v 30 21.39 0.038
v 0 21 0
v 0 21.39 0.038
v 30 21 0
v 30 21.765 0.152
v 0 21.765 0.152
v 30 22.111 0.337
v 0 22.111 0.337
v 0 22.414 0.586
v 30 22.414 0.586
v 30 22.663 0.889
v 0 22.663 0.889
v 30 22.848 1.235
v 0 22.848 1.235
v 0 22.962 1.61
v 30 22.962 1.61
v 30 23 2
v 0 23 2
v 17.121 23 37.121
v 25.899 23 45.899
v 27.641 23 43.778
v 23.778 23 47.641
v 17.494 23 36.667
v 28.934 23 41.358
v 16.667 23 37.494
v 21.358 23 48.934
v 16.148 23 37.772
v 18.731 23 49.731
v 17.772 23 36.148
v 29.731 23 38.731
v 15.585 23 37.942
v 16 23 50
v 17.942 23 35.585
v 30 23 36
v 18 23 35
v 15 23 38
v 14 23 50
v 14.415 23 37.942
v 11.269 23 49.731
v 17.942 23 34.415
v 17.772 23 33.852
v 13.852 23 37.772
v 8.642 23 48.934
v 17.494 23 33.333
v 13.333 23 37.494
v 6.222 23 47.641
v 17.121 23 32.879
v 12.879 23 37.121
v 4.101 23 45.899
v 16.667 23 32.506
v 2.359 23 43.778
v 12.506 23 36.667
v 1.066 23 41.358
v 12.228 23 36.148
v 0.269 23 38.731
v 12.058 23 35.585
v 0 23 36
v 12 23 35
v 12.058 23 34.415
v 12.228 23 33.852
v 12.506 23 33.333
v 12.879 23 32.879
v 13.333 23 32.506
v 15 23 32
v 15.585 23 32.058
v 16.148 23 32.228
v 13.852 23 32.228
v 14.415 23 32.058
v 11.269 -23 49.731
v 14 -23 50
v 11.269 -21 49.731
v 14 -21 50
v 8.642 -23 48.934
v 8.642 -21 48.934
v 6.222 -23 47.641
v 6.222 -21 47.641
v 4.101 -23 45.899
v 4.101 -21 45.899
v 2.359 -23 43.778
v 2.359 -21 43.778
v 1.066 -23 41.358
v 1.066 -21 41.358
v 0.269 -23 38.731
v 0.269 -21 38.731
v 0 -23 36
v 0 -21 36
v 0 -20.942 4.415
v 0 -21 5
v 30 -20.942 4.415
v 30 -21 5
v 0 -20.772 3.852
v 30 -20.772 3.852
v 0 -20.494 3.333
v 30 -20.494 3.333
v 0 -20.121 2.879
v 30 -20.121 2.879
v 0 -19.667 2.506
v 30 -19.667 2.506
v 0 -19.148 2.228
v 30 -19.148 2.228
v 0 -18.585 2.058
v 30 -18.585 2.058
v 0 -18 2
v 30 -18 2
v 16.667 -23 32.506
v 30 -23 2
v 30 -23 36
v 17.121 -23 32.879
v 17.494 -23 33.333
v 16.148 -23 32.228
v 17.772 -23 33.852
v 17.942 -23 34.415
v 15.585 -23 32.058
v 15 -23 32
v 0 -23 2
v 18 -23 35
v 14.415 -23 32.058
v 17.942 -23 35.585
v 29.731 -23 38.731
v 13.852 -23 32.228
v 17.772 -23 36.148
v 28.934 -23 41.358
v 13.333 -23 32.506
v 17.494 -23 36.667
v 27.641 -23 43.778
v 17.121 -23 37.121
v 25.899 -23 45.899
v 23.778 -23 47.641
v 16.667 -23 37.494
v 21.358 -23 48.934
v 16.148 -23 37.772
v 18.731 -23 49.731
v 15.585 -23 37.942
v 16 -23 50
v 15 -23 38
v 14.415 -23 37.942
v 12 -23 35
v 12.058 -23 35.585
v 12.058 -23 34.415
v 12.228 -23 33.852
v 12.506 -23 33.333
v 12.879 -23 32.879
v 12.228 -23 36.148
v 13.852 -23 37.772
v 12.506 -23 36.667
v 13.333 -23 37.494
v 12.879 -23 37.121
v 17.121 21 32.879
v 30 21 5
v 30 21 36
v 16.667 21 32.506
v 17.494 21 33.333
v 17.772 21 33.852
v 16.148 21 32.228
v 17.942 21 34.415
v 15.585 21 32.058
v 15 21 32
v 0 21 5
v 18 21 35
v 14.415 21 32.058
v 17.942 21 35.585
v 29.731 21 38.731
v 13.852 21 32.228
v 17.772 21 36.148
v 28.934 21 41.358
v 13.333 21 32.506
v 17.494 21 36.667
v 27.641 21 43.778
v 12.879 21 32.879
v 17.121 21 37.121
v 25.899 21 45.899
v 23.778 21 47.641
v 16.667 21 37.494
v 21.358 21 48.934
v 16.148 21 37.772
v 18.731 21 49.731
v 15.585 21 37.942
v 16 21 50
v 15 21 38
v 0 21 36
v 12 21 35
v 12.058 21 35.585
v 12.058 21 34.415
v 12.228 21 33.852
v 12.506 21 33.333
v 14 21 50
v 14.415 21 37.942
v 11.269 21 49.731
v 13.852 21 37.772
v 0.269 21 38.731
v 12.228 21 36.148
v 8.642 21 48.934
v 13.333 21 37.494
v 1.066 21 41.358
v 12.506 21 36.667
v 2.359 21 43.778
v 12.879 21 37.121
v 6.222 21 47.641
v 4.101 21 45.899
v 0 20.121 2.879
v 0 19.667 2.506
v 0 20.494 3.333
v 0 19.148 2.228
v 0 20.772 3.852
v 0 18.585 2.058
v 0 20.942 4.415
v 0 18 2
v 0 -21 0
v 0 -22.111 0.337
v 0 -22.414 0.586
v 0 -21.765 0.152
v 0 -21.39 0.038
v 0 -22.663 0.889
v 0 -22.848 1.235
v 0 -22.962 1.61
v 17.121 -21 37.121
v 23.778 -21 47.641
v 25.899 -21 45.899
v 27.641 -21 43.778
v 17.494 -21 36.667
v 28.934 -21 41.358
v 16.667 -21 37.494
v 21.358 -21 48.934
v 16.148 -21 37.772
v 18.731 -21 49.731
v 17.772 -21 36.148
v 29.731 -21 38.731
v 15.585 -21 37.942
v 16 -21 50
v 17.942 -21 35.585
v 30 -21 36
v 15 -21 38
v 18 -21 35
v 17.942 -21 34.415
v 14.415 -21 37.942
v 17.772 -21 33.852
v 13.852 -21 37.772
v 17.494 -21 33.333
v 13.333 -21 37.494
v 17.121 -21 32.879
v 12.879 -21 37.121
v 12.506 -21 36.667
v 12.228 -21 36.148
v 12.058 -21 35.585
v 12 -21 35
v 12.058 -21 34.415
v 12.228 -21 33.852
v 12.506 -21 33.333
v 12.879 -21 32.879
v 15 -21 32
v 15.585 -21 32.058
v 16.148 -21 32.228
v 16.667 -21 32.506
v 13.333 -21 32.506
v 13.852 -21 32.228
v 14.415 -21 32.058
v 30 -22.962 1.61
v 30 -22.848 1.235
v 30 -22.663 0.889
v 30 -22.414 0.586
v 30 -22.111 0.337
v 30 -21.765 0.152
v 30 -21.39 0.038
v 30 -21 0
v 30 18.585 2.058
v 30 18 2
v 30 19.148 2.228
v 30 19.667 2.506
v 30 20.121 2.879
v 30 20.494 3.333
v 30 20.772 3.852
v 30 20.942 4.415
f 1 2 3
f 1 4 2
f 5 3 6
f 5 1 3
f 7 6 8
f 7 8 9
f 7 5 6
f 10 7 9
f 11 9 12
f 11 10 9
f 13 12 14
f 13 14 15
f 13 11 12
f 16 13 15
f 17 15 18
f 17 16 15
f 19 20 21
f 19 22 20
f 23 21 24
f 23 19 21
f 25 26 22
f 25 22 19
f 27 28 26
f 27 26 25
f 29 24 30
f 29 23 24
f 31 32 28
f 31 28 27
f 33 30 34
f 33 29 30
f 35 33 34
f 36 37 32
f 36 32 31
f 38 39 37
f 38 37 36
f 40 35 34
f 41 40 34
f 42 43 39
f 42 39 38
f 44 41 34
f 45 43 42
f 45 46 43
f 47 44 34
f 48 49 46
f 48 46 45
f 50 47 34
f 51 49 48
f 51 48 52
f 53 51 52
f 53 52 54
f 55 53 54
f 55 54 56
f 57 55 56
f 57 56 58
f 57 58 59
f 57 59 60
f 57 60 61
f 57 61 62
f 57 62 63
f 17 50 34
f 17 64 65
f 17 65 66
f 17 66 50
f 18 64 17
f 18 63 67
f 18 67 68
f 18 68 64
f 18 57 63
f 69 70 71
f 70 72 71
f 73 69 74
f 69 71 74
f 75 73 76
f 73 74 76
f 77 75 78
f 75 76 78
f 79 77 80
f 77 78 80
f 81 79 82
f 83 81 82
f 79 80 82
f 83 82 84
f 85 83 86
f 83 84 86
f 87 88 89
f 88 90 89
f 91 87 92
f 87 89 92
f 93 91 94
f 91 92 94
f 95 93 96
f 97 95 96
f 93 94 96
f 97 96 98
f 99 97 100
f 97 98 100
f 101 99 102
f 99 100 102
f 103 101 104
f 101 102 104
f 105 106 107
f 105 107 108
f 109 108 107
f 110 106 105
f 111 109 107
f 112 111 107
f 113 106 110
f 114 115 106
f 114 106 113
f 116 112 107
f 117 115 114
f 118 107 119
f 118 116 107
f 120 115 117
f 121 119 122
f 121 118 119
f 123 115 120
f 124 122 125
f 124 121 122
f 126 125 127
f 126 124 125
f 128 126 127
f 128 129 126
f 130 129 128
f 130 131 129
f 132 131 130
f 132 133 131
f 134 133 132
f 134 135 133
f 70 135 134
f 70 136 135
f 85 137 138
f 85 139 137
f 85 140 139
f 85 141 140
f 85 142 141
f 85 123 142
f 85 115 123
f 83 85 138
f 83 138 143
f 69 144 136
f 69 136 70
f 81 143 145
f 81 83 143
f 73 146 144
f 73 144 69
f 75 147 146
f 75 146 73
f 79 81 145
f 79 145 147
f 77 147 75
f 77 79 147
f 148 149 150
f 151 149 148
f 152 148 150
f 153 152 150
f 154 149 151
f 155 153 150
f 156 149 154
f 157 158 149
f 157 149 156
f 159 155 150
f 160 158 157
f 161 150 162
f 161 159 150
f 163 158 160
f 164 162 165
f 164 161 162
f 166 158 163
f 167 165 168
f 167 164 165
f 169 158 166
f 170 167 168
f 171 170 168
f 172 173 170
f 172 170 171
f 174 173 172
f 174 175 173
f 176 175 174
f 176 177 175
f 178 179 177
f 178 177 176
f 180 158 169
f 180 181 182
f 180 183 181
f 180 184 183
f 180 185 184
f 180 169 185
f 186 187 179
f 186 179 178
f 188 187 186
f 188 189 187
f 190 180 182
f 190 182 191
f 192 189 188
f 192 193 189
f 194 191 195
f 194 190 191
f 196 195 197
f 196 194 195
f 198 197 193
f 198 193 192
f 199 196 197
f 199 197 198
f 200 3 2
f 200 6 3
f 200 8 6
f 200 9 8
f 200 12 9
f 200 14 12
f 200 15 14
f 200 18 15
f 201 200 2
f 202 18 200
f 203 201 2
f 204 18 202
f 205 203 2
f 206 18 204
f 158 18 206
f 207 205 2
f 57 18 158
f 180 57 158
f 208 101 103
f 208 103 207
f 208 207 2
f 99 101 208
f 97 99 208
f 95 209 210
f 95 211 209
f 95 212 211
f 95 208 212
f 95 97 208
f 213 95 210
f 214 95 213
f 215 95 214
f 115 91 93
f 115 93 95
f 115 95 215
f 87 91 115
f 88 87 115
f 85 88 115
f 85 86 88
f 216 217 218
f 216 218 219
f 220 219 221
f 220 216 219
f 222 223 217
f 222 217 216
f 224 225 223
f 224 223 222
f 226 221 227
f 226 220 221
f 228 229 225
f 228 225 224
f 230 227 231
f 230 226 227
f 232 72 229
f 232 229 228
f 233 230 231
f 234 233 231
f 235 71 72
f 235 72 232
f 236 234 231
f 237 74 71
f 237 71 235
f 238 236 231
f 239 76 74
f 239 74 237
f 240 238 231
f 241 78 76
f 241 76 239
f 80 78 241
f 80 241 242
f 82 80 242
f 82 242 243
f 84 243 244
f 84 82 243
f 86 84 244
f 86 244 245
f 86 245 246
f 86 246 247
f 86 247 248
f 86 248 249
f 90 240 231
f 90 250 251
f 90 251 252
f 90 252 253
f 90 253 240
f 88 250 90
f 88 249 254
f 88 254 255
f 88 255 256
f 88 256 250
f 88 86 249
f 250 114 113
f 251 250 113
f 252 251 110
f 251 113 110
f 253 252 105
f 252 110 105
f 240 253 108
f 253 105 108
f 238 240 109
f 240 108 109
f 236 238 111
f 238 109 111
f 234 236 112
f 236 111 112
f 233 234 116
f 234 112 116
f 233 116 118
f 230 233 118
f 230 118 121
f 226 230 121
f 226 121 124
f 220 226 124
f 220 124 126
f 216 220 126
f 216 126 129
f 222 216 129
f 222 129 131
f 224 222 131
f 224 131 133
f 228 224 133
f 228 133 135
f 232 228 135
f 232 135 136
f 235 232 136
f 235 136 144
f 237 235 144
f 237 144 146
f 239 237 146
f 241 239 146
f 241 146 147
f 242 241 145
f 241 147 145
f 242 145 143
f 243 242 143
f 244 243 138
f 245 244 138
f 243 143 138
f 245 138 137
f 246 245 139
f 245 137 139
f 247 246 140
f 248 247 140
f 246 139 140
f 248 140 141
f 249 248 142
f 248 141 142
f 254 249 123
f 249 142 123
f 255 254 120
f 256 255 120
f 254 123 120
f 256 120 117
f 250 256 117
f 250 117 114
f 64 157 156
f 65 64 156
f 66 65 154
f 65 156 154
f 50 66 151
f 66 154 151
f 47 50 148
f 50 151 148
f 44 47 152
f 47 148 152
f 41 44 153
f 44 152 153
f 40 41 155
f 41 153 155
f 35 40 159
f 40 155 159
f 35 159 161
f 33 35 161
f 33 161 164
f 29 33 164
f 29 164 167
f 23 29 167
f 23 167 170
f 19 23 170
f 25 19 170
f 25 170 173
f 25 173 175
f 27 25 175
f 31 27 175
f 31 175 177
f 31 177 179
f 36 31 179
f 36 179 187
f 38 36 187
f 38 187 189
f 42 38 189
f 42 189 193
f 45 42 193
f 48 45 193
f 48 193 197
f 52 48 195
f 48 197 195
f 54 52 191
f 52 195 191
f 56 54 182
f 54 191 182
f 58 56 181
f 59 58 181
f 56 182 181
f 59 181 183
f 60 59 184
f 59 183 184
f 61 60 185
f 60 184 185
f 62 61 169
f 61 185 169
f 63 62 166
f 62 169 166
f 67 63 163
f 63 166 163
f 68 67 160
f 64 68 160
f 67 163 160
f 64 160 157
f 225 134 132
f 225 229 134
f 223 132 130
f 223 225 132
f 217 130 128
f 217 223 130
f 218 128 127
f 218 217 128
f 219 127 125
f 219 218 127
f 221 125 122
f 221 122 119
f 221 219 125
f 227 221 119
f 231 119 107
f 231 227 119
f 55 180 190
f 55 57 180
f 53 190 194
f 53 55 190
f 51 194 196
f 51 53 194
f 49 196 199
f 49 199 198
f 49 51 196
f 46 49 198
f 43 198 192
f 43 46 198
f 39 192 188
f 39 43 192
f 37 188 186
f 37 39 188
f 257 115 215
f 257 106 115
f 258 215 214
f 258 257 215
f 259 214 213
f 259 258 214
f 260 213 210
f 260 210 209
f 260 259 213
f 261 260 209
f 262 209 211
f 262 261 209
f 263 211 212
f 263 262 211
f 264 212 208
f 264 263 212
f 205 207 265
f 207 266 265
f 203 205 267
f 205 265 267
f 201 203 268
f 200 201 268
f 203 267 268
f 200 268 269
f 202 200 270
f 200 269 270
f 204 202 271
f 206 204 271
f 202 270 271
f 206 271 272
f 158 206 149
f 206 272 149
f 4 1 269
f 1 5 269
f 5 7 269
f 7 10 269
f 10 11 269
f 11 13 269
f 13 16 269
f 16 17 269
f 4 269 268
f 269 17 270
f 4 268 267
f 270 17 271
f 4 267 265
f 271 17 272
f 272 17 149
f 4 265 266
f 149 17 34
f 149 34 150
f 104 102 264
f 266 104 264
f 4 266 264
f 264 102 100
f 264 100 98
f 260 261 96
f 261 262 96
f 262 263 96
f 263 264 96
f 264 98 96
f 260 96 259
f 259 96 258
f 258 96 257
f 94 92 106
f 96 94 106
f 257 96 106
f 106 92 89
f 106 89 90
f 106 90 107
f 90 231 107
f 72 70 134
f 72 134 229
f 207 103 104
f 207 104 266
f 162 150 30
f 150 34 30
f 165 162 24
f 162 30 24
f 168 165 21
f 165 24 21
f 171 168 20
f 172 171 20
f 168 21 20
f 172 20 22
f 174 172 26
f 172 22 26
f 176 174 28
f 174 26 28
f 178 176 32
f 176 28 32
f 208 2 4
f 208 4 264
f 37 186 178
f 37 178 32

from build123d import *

# Parameters (mm, degrees)
PAD020_DEPTH  = 30
SKETCH004_R   = 3
HOLE003_DEPTH = 46.001
FILLET_R      = 14
FILLET011_R   = 3
FILLET012_R   = 2


with BuildPart() as part:
    # Sketch036 → Pad020 (new body)
    with BuildSketch(Plane.YZ):
        Polygon((-23, 50), (-21, 50), (-21, 2), (21, 2), (21, 50), (23, 50), (23, 0), (-23, 0), align=None)
    extrude(amount=PAD020_DEPTH)

    # Sketch004 (on Face8 of Pad020) → Hole003 (cut, through all)
    with BuildSketch(Plane(origin=(0, -23, 0), x_dir=(0, 0, -1), z_dir=(0, -1, 0))):
        with Locations((-35, 15)):
            Circle(SKETCH004_R)
    extrude(amount=-HOLE003_DEPTH, mode=Mode.SUBTRACT)

    # Fillet
    fillet_edges = [part.edges().sort_by_distance(p)[0] for p in [
        (30, 22, 50),
        (30, -22, 50),
        (0, -22, 50),
        (0, 22, 50),
    ]]
    fillet(fillet_edges, radius=FILLET_R)

    # Fillet011
    fillet011_edges = [part.edges().sort_by_distance(p)[0] for p in [
        (15, 21, 2),
        (15, -21, 2),
    ]]
    fillet(fillet011_edges, radius=FILLET011_R)

    # Fillet012
    fillet012_edges = [part.edges().sort_by_distance(p)[0] for p in [
        (15, -23, 0),
        (15, 23, 0),
    ]]
    fillet(fillet012_edges, radius=FILLET012_R)


solid = part.part
